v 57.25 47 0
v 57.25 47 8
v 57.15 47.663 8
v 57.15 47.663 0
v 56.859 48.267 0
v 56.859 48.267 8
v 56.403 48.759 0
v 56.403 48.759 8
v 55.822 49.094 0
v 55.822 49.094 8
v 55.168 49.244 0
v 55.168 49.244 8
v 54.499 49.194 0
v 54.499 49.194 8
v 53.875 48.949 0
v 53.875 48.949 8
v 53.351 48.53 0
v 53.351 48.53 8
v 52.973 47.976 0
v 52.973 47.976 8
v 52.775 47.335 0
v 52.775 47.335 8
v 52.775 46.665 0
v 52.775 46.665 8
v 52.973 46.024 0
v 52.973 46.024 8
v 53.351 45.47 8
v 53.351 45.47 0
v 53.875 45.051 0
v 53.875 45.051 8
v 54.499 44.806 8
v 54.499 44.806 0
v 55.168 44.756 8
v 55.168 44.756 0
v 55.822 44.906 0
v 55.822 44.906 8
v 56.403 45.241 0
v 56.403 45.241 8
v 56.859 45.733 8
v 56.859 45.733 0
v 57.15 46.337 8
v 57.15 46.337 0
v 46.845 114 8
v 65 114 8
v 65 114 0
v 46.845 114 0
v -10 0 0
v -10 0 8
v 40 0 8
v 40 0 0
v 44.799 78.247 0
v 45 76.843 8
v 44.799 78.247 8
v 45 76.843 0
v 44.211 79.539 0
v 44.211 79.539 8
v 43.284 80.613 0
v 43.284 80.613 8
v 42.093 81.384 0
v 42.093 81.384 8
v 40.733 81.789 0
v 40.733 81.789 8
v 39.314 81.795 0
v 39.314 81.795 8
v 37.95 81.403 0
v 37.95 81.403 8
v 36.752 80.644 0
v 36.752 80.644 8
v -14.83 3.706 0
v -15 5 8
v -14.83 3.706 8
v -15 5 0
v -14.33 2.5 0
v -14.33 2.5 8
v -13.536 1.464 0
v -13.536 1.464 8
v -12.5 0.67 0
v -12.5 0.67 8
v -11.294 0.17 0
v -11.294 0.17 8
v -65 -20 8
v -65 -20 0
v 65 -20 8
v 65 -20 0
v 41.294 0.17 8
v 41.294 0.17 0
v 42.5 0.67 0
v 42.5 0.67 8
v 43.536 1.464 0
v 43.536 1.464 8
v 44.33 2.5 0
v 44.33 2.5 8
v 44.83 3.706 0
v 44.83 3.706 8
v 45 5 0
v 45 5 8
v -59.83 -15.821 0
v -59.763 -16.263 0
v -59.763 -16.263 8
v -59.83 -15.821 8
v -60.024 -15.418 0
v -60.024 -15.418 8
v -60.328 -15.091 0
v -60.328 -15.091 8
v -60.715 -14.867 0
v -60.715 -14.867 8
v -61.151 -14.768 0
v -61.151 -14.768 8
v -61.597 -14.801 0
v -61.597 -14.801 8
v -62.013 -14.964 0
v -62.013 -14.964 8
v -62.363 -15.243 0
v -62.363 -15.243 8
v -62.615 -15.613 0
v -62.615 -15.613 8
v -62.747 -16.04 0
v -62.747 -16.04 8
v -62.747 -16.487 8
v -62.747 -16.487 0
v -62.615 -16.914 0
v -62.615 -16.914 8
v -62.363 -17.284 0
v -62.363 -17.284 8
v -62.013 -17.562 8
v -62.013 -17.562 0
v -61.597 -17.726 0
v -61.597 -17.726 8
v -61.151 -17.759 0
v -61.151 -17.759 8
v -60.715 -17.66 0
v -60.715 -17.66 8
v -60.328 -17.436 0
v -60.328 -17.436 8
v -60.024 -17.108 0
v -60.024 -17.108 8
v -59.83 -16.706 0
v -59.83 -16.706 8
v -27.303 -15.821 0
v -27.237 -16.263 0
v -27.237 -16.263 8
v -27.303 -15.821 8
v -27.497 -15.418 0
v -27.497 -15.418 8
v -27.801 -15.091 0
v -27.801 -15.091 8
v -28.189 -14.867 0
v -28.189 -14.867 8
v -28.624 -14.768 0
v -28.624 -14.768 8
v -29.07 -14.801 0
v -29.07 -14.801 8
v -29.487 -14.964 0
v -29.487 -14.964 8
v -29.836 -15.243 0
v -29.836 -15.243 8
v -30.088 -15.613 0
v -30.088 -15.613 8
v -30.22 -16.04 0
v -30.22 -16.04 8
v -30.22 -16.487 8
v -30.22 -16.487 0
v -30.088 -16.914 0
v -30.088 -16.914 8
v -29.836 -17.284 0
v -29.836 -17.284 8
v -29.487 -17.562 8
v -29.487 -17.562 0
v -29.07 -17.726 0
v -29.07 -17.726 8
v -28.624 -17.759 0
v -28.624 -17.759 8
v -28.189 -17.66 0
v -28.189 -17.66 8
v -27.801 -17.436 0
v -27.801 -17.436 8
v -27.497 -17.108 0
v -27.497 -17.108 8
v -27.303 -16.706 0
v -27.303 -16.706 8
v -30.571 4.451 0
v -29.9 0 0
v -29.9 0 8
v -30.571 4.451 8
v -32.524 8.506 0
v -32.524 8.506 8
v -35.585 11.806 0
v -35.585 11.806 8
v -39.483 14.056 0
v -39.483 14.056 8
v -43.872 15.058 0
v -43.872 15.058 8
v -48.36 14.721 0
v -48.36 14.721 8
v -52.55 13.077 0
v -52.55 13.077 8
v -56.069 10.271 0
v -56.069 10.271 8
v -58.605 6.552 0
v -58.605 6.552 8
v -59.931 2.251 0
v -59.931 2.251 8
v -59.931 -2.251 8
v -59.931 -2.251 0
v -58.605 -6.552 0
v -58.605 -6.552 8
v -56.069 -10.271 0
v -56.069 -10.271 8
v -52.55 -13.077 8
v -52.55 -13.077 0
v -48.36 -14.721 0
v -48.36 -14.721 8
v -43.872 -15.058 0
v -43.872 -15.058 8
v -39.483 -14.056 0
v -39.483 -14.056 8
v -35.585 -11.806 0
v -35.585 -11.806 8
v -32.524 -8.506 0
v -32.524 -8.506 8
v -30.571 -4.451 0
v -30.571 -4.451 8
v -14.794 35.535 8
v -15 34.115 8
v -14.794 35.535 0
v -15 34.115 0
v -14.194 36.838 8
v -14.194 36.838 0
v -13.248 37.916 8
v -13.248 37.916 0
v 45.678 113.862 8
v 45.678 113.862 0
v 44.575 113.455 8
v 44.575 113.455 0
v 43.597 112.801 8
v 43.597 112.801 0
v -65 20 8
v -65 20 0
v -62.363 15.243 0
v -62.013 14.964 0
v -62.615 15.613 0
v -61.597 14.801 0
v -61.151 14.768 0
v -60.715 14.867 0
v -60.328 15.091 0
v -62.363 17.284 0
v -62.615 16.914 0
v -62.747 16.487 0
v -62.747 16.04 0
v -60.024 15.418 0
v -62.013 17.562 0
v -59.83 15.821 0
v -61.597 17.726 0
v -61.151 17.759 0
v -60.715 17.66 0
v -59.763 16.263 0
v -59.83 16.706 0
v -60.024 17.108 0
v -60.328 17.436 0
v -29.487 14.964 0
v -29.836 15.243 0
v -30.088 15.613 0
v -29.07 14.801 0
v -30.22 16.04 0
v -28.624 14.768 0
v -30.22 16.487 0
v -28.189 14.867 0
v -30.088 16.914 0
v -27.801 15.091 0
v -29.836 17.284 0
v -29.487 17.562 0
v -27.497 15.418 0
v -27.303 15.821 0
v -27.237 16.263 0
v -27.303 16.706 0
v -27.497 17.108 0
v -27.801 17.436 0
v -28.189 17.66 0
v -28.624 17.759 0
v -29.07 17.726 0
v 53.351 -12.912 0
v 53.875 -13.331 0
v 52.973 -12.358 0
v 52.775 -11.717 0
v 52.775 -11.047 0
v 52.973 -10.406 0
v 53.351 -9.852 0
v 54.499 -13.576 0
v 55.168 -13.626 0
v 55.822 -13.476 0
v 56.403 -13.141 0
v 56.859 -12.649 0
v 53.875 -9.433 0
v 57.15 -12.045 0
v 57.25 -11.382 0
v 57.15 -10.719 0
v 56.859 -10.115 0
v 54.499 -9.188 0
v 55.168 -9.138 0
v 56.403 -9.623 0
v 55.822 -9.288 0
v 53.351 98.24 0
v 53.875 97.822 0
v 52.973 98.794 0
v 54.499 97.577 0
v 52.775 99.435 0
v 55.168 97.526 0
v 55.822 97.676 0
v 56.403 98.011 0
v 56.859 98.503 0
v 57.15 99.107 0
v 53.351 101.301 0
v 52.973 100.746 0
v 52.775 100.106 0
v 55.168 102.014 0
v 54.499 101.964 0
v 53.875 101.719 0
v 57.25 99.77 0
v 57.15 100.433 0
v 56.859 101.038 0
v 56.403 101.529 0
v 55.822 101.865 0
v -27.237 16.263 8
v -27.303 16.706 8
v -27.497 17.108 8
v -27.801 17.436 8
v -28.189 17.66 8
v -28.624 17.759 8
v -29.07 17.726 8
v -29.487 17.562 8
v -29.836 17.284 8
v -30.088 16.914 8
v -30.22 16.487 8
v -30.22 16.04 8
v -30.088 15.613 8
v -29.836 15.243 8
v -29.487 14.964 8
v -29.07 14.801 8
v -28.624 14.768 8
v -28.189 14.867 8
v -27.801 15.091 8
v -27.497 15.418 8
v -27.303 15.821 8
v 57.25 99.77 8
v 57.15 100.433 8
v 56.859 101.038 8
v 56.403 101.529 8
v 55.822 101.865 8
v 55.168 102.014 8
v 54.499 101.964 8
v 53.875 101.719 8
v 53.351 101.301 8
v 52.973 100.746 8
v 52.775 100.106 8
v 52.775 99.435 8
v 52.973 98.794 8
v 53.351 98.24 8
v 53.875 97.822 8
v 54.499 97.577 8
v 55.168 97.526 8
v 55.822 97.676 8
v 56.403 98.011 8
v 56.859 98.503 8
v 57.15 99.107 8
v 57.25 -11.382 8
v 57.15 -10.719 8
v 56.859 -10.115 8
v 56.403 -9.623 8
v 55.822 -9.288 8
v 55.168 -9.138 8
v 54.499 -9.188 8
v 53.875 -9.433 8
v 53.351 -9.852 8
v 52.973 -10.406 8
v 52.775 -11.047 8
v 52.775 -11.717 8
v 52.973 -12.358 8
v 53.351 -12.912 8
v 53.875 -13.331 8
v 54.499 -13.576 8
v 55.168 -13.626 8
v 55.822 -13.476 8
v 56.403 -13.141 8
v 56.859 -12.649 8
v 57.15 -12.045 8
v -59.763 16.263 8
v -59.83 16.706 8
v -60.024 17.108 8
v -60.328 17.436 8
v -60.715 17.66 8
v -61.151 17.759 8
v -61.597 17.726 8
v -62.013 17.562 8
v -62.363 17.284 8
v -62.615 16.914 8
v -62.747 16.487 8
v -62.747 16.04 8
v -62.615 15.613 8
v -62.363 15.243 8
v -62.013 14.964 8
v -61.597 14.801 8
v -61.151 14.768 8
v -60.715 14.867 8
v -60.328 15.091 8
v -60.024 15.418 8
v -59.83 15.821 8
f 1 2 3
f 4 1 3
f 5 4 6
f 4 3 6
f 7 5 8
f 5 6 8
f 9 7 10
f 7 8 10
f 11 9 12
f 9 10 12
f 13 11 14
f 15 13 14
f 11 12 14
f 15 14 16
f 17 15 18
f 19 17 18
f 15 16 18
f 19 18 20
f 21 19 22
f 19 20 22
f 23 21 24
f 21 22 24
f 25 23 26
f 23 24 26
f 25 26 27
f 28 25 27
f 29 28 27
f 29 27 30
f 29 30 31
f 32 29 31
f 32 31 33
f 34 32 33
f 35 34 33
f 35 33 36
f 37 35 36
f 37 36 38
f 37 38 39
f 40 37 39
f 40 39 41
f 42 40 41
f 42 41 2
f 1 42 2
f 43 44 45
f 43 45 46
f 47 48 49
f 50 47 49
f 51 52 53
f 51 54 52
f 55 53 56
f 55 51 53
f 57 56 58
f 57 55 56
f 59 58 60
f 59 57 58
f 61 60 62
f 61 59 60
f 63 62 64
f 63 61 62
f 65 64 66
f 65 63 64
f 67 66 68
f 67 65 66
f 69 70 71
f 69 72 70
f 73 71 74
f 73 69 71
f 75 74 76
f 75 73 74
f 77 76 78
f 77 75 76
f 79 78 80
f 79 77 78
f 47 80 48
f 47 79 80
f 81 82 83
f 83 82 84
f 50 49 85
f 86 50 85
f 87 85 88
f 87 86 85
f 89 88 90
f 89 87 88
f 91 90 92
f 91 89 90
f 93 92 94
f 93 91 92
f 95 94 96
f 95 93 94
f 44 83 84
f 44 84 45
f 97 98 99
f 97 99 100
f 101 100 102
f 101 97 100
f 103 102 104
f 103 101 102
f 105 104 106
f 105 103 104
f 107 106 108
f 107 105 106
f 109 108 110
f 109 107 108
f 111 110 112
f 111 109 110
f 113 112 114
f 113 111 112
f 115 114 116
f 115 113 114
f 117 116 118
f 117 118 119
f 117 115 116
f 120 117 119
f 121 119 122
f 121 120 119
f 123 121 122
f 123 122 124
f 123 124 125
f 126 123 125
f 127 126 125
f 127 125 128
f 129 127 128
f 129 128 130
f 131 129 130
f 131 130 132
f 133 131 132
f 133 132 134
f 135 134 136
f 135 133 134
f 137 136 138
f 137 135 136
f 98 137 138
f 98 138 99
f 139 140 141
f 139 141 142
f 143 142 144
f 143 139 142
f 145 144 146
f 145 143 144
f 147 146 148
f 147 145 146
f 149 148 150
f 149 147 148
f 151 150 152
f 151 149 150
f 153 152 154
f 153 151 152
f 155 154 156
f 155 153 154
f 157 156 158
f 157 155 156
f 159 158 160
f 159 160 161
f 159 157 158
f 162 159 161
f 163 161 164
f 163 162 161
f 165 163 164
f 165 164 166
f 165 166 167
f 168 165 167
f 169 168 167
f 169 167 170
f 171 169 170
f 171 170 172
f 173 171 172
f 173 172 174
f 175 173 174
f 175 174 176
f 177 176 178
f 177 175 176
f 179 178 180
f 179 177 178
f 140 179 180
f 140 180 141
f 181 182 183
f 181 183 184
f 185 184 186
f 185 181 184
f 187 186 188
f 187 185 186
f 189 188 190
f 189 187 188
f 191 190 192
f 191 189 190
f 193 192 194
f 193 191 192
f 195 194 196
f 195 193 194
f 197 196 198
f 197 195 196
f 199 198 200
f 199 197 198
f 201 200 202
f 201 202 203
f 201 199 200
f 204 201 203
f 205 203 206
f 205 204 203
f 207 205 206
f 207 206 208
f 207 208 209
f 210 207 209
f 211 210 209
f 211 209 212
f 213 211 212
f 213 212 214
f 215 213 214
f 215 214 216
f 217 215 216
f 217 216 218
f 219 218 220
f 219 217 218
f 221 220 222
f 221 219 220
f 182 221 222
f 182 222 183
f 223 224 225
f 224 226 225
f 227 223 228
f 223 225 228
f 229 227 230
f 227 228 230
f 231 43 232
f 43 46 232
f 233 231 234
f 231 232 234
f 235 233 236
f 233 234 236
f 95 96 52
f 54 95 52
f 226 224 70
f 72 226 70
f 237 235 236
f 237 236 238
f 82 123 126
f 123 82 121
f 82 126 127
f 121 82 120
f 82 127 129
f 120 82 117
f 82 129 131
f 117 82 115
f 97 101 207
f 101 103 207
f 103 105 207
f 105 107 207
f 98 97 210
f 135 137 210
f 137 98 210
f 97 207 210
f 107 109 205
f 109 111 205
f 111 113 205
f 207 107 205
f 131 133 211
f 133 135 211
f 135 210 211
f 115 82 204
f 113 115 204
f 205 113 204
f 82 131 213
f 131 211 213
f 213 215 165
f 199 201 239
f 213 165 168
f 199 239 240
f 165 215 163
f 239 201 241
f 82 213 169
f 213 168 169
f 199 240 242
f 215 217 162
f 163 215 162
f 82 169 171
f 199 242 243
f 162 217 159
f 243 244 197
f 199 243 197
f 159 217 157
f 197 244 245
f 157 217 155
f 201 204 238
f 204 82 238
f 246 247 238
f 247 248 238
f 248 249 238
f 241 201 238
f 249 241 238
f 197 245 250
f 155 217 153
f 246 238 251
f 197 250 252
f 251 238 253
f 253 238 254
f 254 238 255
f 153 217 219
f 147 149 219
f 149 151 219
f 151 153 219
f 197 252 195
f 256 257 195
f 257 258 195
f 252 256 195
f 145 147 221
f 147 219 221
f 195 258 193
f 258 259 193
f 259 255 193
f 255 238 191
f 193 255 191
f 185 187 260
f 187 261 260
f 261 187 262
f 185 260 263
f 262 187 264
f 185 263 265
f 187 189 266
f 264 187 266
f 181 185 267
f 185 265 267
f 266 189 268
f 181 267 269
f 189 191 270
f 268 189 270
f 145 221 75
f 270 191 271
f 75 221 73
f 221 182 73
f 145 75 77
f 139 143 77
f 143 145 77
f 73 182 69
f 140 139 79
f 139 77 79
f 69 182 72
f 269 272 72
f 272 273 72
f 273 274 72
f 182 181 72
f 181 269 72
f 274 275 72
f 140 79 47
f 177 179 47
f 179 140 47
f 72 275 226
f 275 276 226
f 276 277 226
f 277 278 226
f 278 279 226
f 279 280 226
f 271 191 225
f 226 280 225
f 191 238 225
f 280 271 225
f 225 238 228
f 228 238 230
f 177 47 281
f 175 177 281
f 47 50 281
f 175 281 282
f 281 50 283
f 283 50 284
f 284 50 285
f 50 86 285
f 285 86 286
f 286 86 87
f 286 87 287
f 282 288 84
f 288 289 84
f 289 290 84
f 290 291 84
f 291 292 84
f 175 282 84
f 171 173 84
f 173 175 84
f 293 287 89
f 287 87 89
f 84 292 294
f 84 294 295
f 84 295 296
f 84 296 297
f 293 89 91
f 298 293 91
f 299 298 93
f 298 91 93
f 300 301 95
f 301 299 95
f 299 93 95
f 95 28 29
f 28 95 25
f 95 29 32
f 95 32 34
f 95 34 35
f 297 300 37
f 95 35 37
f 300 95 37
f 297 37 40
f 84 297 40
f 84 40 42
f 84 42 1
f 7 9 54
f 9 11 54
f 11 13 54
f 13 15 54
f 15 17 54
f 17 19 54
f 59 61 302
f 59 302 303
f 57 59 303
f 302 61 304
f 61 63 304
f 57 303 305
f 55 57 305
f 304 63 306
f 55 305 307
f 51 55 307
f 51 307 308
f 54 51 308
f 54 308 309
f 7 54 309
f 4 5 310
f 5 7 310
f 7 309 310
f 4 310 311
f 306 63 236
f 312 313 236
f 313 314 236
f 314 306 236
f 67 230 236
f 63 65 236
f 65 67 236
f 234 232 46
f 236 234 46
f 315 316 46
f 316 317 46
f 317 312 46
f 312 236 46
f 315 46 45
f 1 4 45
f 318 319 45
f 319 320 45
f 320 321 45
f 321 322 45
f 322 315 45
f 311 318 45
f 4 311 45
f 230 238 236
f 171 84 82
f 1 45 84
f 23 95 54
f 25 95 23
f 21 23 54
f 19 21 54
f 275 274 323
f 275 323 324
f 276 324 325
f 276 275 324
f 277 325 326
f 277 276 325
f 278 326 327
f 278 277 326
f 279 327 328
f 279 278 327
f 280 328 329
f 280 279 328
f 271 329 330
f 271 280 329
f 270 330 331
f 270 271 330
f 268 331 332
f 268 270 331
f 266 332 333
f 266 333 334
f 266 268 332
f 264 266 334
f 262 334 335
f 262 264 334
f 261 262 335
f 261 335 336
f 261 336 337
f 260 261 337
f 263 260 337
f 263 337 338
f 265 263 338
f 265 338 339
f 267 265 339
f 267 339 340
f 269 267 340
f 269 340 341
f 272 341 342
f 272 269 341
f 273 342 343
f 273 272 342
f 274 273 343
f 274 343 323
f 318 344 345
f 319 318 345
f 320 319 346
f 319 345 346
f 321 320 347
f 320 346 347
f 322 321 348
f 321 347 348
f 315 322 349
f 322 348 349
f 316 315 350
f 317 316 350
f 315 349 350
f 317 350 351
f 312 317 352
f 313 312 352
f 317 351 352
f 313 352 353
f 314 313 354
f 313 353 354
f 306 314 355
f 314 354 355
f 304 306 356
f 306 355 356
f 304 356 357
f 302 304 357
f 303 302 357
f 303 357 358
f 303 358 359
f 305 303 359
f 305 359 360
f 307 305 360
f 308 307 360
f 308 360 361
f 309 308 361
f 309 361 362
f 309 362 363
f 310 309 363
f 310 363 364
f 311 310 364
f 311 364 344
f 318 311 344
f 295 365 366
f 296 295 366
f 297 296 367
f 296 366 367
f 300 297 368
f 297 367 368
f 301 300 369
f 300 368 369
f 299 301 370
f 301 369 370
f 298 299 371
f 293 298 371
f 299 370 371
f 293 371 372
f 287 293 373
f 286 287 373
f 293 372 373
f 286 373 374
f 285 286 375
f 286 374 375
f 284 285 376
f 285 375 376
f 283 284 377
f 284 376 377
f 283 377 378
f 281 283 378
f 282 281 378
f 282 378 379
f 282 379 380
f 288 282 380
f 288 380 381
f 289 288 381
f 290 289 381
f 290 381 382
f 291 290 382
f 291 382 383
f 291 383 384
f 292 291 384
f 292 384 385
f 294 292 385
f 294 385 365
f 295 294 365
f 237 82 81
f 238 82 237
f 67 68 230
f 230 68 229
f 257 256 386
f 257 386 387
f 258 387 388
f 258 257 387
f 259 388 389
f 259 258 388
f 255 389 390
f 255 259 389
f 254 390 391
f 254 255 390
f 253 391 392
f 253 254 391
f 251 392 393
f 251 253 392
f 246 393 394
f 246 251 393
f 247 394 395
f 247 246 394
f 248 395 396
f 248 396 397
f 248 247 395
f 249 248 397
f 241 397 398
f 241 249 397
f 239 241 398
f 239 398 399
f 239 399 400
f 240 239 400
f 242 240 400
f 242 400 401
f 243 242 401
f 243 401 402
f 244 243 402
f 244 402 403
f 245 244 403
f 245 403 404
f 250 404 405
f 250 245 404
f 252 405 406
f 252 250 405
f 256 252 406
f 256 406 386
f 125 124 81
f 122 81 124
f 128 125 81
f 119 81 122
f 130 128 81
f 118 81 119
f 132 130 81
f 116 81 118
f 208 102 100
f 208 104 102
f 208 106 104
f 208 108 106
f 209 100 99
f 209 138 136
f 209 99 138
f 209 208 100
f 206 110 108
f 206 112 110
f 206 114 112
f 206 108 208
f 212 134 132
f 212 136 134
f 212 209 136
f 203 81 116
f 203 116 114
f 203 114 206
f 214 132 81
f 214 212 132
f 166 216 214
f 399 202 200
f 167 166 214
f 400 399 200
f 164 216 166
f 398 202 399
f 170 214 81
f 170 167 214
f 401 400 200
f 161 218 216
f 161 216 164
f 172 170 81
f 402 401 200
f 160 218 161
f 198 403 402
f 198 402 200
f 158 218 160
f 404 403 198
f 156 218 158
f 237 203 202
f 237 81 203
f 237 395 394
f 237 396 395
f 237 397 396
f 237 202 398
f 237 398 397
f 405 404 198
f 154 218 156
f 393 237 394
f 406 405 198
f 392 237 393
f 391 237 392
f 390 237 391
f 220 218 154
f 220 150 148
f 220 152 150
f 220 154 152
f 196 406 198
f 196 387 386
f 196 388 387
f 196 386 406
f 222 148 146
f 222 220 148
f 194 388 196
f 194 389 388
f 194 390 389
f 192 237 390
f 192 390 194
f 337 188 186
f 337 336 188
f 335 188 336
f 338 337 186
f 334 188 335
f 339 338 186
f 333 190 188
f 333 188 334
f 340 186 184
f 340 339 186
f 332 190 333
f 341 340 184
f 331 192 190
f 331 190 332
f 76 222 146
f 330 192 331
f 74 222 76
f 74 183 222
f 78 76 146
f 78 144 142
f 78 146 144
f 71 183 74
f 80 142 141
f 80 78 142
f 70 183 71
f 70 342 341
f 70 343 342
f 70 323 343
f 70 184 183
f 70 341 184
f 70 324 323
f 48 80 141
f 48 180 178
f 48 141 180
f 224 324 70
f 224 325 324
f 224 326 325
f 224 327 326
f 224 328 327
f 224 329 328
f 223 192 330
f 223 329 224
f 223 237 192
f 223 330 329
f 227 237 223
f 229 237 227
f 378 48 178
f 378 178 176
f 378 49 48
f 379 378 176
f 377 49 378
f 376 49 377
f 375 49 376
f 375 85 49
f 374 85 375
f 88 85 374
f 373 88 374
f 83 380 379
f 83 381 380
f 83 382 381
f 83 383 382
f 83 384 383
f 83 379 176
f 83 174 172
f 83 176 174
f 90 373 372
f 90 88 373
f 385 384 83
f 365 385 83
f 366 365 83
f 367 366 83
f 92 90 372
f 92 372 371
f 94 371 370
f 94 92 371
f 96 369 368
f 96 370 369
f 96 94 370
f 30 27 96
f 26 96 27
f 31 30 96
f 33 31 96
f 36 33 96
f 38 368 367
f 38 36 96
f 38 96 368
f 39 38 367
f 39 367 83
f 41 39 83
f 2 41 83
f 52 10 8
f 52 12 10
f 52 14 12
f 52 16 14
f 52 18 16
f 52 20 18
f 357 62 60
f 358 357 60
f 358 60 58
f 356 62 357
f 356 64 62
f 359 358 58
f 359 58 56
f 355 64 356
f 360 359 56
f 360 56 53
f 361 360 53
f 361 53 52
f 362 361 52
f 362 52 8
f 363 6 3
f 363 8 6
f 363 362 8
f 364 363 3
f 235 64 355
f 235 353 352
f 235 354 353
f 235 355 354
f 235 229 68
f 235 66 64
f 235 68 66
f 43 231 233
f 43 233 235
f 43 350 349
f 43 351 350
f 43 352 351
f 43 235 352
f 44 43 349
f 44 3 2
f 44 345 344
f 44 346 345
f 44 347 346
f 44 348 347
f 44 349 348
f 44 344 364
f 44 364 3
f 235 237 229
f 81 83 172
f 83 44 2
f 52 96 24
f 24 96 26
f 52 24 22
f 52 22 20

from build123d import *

# Parameters (mm, degrees)
F0_W     = 130
F0_H     = 40
F0_R     = 1.5
F0_R_2   = 15.1
F1_DEPTH = 8
F3_DEPTH = 8
F4_R     = 2.25
F5_DEPTH = 8.001
F6_R     = 5


with BuildPart() as f1:
    # F0 (on Top) → F1 (new body)
    with BuildSketch(Plane.XY):
        Rectangle(F0_W, F0_H)
        with Locations((-61.263456, -16.263456)):
            Circle(F0_R, mode=Mode.SUBTRACT)
        with Locations((-28.736544, -16.263456)):
            Circle(F0_R, mode=Mode.SUBTRACT)
        with Locations((-45, 0)):
            Circle(F0_R_2, mode=Mode.SUBTRACT)
        with Locations((-61.263456, 16.263456)):
            Circle(F0_R, mode=Mode.SUBTRACT)
        with Locations((-28.736544, 16.263456)):
            Circle(F0_R, mode=Mode.SUBTRACT)
    extrude(amount=F1_DEPTH)

    # F2 (on face) → F3 (join)
    with BuildSketch(Plane.XY.offset(8)):
        Polygon((65, 20), (65, 114), (45, 114), (-65, 20), align=None)
    extrude(amount=-F3_DEPTH)

    # F4 (on face) → F5 (cut, through all)
    with BuildSketch(Plane.XY.offset(8)):
        Polygon((-15, 36.419495), (-15, 0), (45, 0), (45, 87.692222), align=None)
        with Locations((55, 99.770185)):
            Circle(F4_R)
        with Locations((55, 47)):
            Circle(F4_R)
        with Locations((55, -11.382008)):
            Circle(F4_R)
    extrude(amount=-F5_DEPTH, mode=Mode.SUBTRACT)

    # F6
    f6_edges = [f1.edges().sort_by_distance(p)[0] for p in [
        (45, 114, 4),
        (-15, 36.419495, 4),
        (45, 87.692222, 4),
        (45, 0, 4),
        (-15, 0, 4),
    ]]
    fillet(f6_edges, radius=F6_R)


solid = f1.part
